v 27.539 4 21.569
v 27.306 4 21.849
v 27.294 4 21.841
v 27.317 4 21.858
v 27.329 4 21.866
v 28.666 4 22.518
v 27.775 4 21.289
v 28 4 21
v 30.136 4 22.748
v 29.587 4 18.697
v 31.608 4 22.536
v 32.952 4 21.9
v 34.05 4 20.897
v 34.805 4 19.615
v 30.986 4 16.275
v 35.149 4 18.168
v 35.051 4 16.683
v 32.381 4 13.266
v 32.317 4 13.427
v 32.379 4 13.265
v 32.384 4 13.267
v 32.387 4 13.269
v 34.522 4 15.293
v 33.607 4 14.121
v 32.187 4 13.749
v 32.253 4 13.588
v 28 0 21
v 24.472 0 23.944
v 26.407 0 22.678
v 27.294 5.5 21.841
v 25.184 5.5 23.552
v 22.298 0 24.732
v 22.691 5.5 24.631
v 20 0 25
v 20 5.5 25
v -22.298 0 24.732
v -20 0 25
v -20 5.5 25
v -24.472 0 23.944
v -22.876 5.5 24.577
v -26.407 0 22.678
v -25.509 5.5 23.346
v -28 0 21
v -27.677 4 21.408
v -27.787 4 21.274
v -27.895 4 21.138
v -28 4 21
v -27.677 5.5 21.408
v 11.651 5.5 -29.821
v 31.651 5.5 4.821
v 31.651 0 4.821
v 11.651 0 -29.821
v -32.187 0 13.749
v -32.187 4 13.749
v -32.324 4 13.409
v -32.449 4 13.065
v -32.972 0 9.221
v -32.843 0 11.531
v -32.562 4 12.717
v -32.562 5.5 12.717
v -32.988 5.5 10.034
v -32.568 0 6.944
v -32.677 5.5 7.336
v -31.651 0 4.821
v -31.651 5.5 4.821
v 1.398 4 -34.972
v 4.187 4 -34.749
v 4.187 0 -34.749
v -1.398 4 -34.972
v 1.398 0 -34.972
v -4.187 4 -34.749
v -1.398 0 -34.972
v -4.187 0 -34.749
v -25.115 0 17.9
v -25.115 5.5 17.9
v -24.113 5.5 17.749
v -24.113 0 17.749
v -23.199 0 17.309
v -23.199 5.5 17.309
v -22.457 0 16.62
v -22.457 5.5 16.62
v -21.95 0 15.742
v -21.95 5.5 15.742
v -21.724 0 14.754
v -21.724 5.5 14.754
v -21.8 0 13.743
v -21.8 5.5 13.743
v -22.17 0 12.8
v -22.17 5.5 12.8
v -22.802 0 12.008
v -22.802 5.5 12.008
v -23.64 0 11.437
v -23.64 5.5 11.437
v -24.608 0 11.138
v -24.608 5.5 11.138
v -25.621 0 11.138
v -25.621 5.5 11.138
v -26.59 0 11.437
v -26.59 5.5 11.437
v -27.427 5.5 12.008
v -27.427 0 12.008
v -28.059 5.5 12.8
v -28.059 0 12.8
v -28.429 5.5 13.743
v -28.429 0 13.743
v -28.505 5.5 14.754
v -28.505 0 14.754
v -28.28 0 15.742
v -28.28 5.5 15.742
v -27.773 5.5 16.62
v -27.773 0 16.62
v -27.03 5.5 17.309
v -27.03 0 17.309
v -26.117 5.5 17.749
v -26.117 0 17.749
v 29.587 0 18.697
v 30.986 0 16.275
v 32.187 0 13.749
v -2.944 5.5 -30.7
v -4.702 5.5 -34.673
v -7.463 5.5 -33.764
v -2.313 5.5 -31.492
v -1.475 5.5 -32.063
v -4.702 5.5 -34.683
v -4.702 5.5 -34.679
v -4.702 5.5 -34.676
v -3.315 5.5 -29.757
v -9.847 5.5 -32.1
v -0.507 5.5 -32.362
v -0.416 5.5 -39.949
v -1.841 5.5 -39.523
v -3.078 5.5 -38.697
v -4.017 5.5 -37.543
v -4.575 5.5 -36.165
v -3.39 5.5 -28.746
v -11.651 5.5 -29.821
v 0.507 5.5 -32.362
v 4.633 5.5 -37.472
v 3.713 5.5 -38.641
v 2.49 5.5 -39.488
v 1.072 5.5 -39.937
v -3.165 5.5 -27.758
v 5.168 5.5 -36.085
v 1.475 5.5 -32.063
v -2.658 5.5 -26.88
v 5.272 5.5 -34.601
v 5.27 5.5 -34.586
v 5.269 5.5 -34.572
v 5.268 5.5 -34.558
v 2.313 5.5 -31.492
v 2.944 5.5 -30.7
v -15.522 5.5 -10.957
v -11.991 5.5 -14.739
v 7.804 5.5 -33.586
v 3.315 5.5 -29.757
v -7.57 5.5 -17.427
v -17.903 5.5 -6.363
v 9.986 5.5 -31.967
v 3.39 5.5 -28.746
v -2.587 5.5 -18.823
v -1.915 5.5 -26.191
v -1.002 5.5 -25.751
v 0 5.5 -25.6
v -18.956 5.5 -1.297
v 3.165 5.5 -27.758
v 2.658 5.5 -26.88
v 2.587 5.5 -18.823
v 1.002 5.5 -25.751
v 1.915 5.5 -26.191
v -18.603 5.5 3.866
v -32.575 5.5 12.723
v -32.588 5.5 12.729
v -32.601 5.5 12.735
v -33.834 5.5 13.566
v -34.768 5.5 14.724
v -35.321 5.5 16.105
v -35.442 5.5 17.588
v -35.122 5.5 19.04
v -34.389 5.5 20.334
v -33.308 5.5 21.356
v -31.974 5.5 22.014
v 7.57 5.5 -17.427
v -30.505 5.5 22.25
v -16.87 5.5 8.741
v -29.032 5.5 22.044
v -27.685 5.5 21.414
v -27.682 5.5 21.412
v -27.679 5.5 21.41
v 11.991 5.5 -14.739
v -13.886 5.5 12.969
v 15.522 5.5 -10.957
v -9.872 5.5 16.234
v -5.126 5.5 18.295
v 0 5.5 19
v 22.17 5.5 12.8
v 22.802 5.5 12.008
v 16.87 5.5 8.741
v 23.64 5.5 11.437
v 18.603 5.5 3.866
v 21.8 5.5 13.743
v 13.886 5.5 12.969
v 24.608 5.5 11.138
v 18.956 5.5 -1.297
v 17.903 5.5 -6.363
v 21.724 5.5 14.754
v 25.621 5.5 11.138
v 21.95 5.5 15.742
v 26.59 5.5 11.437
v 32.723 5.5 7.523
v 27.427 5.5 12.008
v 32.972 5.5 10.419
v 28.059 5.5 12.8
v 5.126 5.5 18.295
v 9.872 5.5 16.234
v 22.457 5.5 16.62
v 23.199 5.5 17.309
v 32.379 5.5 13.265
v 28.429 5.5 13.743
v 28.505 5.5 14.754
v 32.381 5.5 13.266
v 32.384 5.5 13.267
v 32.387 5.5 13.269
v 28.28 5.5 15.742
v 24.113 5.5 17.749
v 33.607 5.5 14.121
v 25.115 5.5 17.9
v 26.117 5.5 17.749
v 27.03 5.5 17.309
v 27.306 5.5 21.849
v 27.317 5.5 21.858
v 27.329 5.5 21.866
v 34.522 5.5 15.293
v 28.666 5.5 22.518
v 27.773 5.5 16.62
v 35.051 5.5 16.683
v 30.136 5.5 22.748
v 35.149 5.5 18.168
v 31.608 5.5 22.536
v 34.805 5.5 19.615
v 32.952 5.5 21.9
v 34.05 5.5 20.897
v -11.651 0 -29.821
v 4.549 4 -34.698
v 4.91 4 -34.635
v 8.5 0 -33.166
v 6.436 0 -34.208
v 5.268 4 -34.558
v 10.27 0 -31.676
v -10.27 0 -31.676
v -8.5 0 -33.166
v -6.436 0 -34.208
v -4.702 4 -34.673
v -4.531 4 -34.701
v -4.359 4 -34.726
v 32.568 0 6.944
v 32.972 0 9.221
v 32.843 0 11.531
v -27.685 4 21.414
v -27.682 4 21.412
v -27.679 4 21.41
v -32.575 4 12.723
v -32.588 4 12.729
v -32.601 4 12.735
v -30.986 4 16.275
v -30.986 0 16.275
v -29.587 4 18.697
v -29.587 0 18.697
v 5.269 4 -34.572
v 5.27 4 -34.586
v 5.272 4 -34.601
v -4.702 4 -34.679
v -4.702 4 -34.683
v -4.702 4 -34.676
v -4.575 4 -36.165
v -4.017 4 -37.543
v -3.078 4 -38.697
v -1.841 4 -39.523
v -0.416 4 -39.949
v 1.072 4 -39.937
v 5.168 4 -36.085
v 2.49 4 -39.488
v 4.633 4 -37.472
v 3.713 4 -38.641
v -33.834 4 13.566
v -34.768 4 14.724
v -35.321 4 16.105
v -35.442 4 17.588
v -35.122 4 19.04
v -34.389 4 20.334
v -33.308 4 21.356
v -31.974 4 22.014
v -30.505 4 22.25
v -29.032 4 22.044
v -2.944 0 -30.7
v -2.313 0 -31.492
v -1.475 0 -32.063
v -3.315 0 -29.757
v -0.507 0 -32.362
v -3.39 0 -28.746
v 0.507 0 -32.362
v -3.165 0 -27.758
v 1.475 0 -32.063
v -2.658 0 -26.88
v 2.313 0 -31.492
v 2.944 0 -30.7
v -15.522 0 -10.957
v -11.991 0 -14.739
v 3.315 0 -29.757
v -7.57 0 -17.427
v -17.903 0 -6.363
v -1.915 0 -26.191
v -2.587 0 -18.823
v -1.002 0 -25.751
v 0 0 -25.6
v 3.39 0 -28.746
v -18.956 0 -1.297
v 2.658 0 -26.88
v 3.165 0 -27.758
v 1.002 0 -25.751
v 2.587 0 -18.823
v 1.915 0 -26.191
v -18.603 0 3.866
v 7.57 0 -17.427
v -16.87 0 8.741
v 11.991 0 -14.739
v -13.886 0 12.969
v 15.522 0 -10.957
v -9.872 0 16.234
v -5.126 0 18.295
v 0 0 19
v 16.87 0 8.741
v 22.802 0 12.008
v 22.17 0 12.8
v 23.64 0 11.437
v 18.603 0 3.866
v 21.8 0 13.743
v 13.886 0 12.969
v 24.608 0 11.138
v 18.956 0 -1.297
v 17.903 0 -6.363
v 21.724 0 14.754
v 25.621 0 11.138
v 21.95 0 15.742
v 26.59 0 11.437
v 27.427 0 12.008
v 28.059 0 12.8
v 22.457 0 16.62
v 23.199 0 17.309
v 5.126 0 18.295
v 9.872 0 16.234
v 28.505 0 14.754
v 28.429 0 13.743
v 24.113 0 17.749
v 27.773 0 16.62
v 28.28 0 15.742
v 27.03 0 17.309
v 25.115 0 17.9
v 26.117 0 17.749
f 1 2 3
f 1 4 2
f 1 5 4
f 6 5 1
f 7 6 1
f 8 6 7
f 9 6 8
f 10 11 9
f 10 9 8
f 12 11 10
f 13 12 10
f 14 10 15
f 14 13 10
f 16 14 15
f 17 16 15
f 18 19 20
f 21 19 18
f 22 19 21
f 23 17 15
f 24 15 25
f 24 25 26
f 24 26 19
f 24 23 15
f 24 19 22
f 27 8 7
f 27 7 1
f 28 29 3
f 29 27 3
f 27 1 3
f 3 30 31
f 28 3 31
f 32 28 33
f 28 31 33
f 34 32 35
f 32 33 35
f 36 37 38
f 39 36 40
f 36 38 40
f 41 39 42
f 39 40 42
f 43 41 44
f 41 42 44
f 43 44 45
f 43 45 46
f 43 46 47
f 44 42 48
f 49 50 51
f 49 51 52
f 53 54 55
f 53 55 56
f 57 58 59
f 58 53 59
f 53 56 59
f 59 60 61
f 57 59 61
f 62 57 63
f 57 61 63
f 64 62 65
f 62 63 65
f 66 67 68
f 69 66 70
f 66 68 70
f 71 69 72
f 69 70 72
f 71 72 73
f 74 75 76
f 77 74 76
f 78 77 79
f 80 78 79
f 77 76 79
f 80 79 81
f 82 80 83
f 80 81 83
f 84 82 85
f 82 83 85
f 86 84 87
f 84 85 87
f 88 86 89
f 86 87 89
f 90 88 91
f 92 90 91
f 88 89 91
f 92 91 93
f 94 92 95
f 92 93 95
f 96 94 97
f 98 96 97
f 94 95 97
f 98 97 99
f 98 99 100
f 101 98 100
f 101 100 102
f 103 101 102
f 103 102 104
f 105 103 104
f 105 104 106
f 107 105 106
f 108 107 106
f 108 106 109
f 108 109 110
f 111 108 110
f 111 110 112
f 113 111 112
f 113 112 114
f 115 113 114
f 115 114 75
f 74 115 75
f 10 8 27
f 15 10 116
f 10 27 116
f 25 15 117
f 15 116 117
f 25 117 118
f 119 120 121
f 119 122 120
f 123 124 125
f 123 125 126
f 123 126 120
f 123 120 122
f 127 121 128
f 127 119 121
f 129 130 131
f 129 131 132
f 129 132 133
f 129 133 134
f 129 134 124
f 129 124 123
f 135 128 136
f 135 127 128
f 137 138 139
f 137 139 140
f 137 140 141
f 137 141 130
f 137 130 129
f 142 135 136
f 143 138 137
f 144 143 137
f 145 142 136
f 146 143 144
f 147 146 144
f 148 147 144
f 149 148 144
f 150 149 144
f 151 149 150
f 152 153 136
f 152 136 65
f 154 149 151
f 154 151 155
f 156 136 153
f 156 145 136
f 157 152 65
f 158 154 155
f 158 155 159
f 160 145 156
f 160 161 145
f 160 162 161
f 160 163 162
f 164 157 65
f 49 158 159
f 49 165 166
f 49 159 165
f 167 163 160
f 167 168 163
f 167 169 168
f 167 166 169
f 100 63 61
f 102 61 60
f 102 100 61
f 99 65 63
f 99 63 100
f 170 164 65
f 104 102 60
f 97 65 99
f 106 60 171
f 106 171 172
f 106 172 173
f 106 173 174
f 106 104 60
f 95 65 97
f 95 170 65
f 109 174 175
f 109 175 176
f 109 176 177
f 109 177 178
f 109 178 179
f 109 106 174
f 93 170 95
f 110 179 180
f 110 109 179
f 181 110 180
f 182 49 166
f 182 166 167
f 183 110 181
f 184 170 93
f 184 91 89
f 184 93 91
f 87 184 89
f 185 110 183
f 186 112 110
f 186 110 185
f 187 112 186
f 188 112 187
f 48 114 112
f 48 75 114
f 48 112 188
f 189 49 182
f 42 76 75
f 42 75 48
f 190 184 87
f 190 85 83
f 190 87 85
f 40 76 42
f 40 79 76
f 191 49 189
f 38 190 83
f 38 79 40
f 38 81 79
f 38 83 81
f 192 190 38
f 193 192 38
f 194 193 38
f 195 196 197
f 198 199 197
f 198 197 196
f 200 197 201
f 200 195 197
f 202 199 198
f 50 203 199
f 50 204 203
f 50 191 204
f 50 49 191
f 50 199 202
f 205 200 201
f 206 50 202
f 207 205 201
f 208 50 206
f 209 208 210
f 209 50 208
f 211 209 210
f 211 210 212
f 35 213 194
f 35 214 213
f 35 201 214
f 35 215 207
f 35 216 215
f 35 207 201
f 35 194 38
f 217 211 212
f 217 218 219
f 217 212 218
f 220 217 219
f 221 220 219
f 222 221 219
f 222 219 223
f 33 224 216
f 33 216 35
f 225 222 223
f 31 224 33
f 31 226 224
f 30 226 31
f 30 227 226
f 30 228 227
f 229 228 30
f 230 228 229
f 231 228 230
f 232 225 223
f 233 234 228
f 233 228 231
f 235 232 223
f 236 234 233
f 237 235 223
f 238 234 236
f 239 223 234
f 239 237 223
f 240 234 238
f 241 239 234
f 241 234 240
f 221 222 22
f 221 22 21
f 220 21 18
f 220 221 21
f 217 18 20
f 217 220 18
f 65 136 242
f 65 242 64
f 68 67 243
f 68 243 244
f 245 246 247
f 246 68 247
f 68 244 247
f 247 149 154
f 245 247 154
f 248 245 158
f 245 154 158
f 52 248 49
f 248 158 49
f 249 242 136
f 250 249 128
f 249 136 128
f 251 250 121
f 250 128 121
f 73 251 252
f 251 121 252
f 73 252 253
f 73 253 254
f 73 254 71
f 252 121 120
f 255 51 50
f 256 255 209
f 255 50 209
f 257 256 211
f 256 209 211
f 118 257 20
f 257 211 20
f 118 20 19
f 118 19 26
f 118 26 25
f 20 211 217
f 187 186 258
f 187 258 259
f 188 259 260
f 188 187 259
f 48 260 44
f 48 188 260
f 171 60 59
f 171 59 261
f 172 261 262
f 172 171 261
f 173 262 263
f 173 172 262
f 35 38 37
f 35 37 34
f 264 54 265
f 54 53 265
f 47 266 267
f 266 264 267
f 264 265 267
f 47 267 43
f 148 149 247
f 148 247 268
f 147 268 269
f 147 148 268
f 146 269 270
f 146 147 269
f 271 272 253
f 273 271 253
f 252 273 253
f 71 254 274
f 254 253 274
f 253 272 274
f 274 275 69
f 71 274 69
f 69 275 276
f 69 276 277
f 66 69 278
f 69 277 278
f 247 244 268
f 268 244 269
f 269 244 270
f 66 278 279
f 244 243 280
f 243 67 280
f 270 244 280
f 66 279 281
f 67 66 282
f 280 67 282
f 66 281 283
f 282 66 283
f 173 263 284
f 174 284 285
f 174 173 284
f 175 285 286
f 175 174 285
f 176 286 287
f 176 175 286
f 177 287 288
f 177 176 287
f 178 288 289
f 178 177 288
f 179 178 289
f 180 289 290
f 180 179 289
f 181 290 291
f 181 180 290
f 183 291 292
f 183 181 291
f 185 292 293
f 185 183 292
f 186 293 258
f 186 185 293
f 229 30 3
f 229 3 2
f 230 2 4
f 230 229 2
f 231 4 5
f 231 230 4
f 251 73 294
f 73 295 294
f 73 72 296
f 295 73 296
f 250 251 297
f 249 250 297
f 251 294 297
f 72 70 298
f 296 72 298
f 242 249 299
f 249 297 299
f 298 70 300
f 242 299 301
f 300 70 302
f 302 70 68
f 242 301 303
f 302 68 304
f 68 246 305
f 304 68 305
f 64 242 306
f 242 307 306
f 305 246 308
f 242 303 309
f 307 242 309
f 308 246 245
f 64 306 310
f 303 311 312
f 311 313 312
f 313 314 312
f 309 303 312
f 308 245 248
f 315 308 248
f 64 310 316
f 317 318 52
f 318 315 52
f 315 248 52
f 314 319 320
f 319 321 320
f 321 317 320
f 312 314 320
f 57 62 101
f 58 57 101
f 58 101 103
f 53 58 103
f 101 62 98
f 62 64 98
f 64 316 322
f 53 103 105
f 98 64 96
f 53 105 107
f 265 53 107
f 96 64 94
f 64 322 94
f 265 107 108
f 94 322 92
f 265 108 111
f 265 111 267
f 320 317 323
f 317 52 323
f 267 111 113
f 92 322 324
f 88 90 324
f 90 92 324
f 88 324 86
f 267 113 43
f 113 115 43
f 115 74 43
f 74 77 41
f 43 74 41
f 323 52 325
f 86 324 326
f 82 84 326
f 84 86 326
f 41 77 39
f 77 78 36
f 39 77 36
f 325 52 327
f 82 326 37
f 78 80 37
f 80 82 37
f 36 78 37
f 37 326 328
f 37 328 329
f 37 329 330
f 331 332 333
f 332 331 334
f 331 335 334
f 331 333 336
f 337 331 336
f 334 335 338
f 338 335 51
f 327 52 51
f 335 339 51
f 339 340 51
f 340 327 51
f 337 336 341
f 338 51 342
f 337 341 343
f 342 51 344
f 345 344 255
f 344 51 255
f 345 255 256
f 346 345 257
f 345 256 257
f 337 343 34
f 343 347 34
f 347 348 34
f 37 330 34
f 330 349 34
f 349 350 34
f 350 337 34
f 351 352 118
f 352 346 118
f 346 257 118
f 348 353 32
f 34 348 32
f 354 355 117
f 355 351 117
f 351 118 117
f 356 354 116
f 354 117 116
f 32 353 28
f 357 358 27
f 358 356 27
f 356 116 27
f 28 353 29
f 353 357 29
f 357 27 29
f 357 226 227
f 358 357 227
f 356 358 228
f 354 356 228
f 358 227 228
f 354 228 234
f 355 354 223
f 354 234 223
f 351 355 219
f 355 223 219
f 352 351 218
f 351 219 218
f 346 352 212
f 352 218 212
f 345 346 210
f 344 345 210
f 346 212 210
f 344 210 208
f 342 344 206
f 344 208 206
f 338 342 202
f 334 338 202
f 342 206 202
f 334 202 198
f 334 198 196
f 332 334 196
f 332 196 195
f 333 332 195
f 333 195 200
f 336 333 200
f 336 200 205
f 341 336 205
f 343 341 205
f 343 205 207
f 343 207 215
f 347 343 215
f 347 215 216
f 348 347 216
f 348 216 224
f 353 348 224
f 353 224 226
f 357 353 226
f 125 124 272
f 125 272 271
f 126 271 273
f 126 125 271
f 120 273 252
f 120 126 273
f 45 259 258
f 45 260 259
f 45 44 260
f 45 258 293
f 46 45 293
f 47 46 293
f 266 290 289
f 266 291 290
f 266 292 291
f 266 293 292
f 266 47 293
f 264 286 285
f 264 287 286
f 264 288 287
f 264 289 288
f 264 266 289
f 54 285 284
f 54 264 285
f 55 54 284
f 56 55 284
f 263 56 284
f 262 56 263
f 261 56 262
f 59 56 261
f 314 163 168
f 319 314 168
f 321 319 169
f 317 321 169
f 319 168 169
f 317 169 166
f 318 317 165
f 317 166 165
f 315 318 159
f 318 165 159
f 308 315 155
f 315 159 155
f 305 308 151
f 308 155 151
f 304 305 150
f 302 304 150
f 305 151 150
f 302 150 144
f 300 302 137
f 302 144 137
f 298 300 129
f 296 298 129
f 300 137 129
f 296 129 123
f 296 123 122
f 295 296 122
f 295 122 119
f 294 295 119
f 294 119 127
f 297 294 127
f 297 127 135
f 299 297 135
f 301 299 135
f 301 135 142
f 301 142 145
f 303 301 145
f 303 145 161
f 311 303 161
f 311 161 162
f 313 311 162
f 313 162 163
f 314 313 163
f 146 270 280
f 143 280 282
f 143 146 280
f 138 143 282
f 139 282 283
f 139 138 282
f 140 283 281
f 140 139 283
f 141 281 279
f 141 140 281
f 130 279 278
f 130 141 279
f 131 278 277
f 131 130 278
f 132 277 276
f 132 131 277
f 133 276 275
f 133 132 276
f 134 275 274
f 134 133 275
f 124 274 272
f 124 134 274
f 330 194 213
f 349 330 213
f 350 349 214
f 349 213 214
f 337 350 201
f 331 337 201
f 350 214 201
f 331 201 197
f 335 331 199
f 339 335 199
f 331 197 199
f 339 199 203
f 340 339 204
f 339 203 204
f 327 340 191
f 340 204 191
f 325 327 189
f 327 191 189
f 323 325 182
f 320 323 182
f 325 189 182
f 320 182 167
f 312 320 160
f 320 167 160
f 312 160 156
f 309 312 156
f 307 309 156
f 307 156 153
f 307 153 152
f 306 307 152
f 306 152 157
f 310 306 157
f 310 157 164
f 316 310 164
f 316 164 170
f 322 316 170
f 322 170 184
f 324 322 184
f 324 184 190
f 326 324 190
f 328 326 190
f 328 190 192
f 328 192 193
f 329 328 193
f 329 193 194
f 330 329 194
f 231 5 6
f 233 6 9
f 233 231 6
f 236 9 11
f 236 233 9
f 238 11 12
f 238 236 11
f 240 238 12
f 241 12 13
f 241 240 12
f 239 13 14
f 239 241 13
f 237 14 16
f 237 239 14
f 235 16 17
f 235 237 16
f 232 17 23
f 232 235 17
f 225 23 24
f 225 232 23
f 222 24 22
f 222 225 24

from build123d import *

# Parameters (mm, degrees)
SKETCH1_R                = 17.5
BOSS_EXTRUDE1_DEPTH      = 5.5
SKETCH2_R                = 35
SKETCH2_R_2              = 17.5
SKETCH2_R_3              = 2.8
BOSS_EXTRUDE2_DEPTH      = 5.5
BOSS_EXTRUDE3_DEPTH      = 2
BOSS_EXTRUDE3_DEPTH_BACK = 5.5
SKETCH4_R                = 2.9
SKETCH5_R                = 5
BOSS_EXTRUDE4_DEPTH      = 1.5
SKETCH3_R                = 17.5
CUT_EXTRUDE1_DEPTH       = 10
SKETCH12_R               = 72.135852014
CUT_EXTRUDE2_DEPTH       = 22
FILLET1_R                = 10
SKETCH13_R               = 3.4
CUT_EXTRUDE3_DEPTH       = 10
SKETCH14_R               = 19
CUT_EXTRUDE4_DEPTH       = 10


with BuildPart() as part:
    # Sketch1 → Boss-Extrude1 (new body)
    with BuildSketch(Plane(origin=(0, 0, 0), x_dir=(1, 0, 0), z_dir=(0, 1, 0))):
        with Locations(Location((0, 0, 0), (0, 0, 270))):
            Circle(SKETCH1_R)
    extrude(amount=BOSS_EXTRUDE1_DEPTH)

    # Sketch2 → Boss-Extrude2 (add)
    with BuildSketch(Plane(origin=(0, 0, 0), x_dir=(1, 0, 0), z_dir=(0, 1, 0))):
        with Locations(Location((0, 0, 0), (0, 0, 270))):
            Circle(SKETCH2_R)
        Circle(SKETCH2_R_2, mode=Mode.SUBTRACT)
        with Locations(Location((0, 29, 0), (0, 0, 270))):
            Circle(SKETCH2_R_3, mode=Mode.SUBTRACT)
        with Locations(Location((25.11473671, -14.5, 0), (0, 0, 270))):
            Circle(SKETCH2_R_3, mode=Mode.SUBTRACT)
        with Locations(Location((-25.11473671, -14.5, 0), (0, 0, 270))):
            Circle(SKETCH2_R_3, mode=Mode.SUBTRACT)
    extrude(amount=BOSS_EXTRUDE2_DEPTH)

    # Sketch4 → Boss-Extrude3 (add, two sides: drawn at the far end of the back side and taken through both)
    with BuildSketch(Plane.XZ.offset(-BOSS_EXTRUDE3_DEPTH_BACK)):
        with Locations(Location((-25.11473671, 14.5, 0), (0, 0, 270))):
            Circle(SKETCH4_R)
        with Locations(Location((25.11473671, 14.5, 0), (0, 0, 270))):
            Circle(SKETCH4_R)
        with Locations(Location((0, -29, 0), (0, 0, 270))):
            Circle(SKETCH4_R)
    extrude(amount=BOSS_EXTRUDE3_DEPTH + BOSS_EXTRUDE3_DEPTH_BACK)

    # Sketch5 → Boss-Extrude4 (add)
    with BuildSketch(Plane(origin=(0, 5.5, 0), x_dir=(1, 0, 0), z_dir=(0, 1, 0))):
        with Locations((-30.453629482, -17.250404383)):
            Circle(SKETCH5_R)
        with Locations((0.28752632, 34.99881896)):
            Circle(SKETCH5_R)
        with Locations((30.166103162, -17.748414577)):
            Circle(SKETCH5_R)
    extrude(amount=-BOSS_EXTRUDE4_DEPTH)

    # Sketch3 → Cut-Extrude1 (cut)
    with BuildSketch(Plane(origin=(0, 5.5, 0), x_dir=(1, 0, 0), z_dir=(0, 1, 0))):
        with Locations(Location((0, 0, 0), (0, 0, 270))):
            Circle(SKETCH3_R)
    extrude(amount=-CUT_EXTRUDE1_DEPTH, mode=Mode.SUBTRACT)

    # Sketch12 → Cut-Extrude2 (cut)
    with BuildSketch(Plane(origin=(0, 5.5, 0), x_dir=(1, 0, 0), z_dir=(0, 1, 0))):
        Circle(SKETCH12_R)
        Polygon((0, 50), (-43.301270189, -25), (43.301270189, -25), align=None, mode=Mode.SUBTRACT)
    extrude(amount=-CUT_EXTRUDE2_DEPTH, mode=Mode.SUBTRACT)

    # Fillet1
    # the kernel refuses this fillet: 10 mm, written as the material it takes off along each edge
    with BuildSketch(Plane(origin=(-24.494897428, 18.7960859, 25), x_dir=(1, 0, 0), z_dir=(0, -1, 0))) as fillet1_piece_1_section:
        with BuildLine():
            CenterArc((4.494897428, -10), FILLET1_R, 90, 53.130102354)
            ThreePointArc((-3.505102572, -4), (-1.828638885, -1.933326291), (0, 0))
            Line((0, 0), (4.494897428, 0))
        make_face()
    fillet1_piece_1 = extrude(amount=32.0921718, mode=Mode.PRIVATE)
    fillet1_piece_1 = fillet1_piece_1 - Plane(origin=(-30.453629482, 4.75, 17.250404383), x_dir=(1, 0, 0), z_dir=(0, 1, 0)) * Cylinder(5, 83, mode=Mode.PRIVATE)
    add(fillet1_piece_1, mode=Mode.SUBTRACT)
    with BuildSketch(Plane(origin=(-24.494897428, 18.7960859, 25), x_dir=(1, 0, 0), z_dir=(0, -1, 0))) as fillet1_piece_2_section:
        with BuildLine():
            CenterArc((4.494897428, -10), FILLET1_R, 90, 53.130102354)
            ThreePointArc((-3.505102572, -4), (-1.828638885, -1.933326291), (0, 0))
            Line((0, 0), (4.494897428, 0))
        make_face()
    fillet1_piece_2 = extrude(amount=32.0921718, mode=Mode.PRIVATE)
    fillet1_piece_2 = split(fillet1_piece_2, bisect_by=Plane(origin=(-27.761621835, 4, 21.309124186), z_dir=(0, -1, 0)), keep=Keep.TOP, mode=Mode.PRIVATE)
    add(fillet1_piece_2, mode=Mode.SUBTRACT)
    with BuildSketch(Plane(origin=(24.494897428, 18.7960859, 25), x_dir=(-1, 0, 0), z_dir=(0, -1, 0))) as fillet1_piece_3_section:
        with BuildLine():
            CenterArc((4.494897428, 10), FILLET1_R, 216.869897646, 53.130102354)
            ThreePointArc((-3.505102572, 4), (-1.828638885, 1.933326291), (0, 0))
            Line((0, 0), (4.494897428, 0))
        make_face()
    fillet1_piece_3 = extrude(amount=32.0921718, mode=Mode.PRIVATE)
    fillet1_piece_3 = fillet1_piece_3 - Plane(origin=(30.166103162, 4.75, 17.748414577), x_dir=(1, 0, 0), z_dir=(0, 1, 0)) * Cylinder(5, 83, mode=Mode.PRIVATE)
    add(fillet1_piece_3, mode=Mode.SUBTRACT)
    with BuildSketch(Plane(origin=(24.494897428, 18.7960859, 25), x_dir=(-1, 0, 0), z_dir=(0, -1, 0))) as fillet1_piece_4_section:
        with BuildLine():
            CenterArc((4.494897428, 10), FILLET1_R, 216.869897646, 53.130102354)
            ThreePointArc((-3.505102572, 4), (-1.828638885, 1.933326291), (0, 0))
            Line((0, 0), (4.494897428, 0))
        make_face()
    fillet1_piece_4 = extrude(amount=32.0921718, mode=Mode.PRIVATE)
    fillet1_piece_4 = split(fillet1_piece_4, bisect_by=Plane(origin=(27.488157838, 4, 21.643747381), z_dir=(0, -1, 0)), keep=Keep.TOP, mode=Mode.PRIVATE)
    add(fillet1_piece_4, mode=Mode.SUBTRACT)
    with BuildSketch(Plane(origin=(-9.403186381, 18.7960859, -33.713203436), x_dir=(-0.5000000000000003, 0, 0.8660254037844386), z_dir=(0, -1, 0))) as fillet1_piece_5_section:
        with BuildLine():
            CenterArc((4.494897428, -10), FILLET1_R, 90, 53.130102354)
            ThreePointArc((-3.505102572, -4), (-1.828638885, -1.933326291), (0, 0))
            Line((0, 0), (4.494897428, 0))
        make_face()
    fillet1_piece_5 = extrude(amount=32.0921718, mode=Mode.PRIVATE)
    fillet1_piece_5 = fillet1_piece_5 - Plane(origin=(0.28752632, 4.75, -34.99881896), x_dir=(1, 0, 0), z_dir=(0, 1, 0)) * Cylinder(5, 83, mode=Mode.PRIVATE)
    add(fillet1_piece_5, mode=Mode.SUBTRACT)
    with BuildSketch(Plane(origin=(-9.403186381, 18.7960859, -33.713203436), x_dir=(-0.5000000000000003, 0, 0.8660254037844386), z_dir=(0, -1, 0))) as fillet1_piece_6_section:
        with BuildLine():
            CenterArc((4.494897428, -10), FILLET1_R, 90, 53.130102354)
            ThreePointArc((-3.505102572, -4), (-1.828638885, -1.933326291), (0, 0))
            Line((0, 0), (4.494897428, 0))
        make_face()
    fillet1_piece_6 = extrude(amount=32.0921718, mode=Mode.PRIVATE)
    fillet1_piece_6 = split(fillet1_piece_6, bisect_by=Plane(origin=(-4.57343196, 4, -34.696831852), z_dir=(0, -1, 0)), keep=Keep.TOP, mode=Mode.PRIVATE)
    add(fillet1_piece_6, mode=Mode.SUBTRACT)
    with BuildSketch(Plane(origin=(-33.898083809, 18.7960859, 8.713203436), x_dir=(0.32181469455231854, 0, 0.9468026734067654), z_dir=(0, -1, 0))) as fillet1_piece_7_section:
        with BuildLine():
            CenterArc((4.558658023, -9.971095222), FILLET1_R, 85.642603122, 53.130102354)
            Line((-2.962352352, -3.380617019), (0, 0))
            ThreePointArc((0, 0), (2.65921718, 0.101166725), (5.31843436, 0))
        make_face()
    fillet1_piece_7 = extrude(amount=32.0921718, mode=Mode.PRIVATE)
    fillet1_piece_7 = fillet1_piece_7 - Plane(origin=(-30.453629482, 4.75, 17.250404383), x_dir=(1, 0, 0), z_dir=(0, 1, 0)) * Cylinder(5, 86, mode=Mode.PRIVATE)
    add(fillet1_piece_7, mode=Mode.SUBTRACT)
    with BuildSketch(Plane(origin=(-33.898083809, 18.7960859, 8.713203436), x_dir=(0.32181469455231854, 0, 0.9468026734067654), z_dir=(0, -1, 0))) as fillet1_piece_8_section:
        with BuildLine():
            CenterArc((4.558658023, -9.971095222), FILLET1_R, 85.642603122, 53.130102354)
            Line((-2.962352352, -3.380617019), (0, 0))
            ThreePointArc((0, 0), (2.65921718, 0.101166725), (5.31843436, 0))
        make_face()
    fillet1_piece_8 = extrude(amount=32.0921718, mode=Mode.PRIVATE)
    fillet1_piece_8 = split(fillet1_piece_8, bisect_by=Plane(origin=(-32.488113984, 4, 12.9835693), z_dir=(0, -1, 0)), keep=Keep.TOP, mode=Mode.PRIVATE)
    add(fillet1_piece_8, mode=Mode.SUBTRACT)
    with BuildSketch(Plane(origin=(33.898083809, 18.7960859, 8.713203436), x_dir=(-0.5000000000000012, 0, -0.8660254037844382), z_dir=(0, -1, 0))) as fillet1_piece_9_section:
        with BuildLine():
            CenterArc((4.494897428, -10), FILLET1_R, 90, 53.130102354)
            ThreePointArc((-3.505102572, -4), (-1.828638885, -1.933326291), (0, 0))
            Line((0, 0), (4.494897428, 0))
        make_face()
    fillet1_piece_9 = extrude(amount=32.0921718, mode=Mode.PRIVATE)
    fillet1_piece_9 = fillet1_piece_9 - Plane(origin=(30.166103162, 4.75, 17.748414577), x_dir=(1, 0, 0), z_dir=(0, 1, 0)) * Cylinder(5, 83, mode=Mode.PRIVATE)
    add(fillet1_piece_9, mode=Mode.SUBTRACT)
    with BuildSketch(Plane(origin=(33.898083809, 18.7960859, 8.713203436), x_dir=(-0.5000000000000012, 0, -0.8660254037844382), z_dir=(0, -1, 0))) as fillet1_piece_10_section:
        with BuildLine():
            CenterArc((4.494897428, -10), FILLET1_R, 90, 53.130102354)
            ThreePointArc((-3.505102572, -4), (-1.828638885, -1.933326291), (0, 0))
            Line((0, 0), (4.494897428, 0))
        make_face()
    fillet1_piece_10 = extrude(amount=32.0921718, mode=Mode.PRIVATE)
    fillet1_piece_10 = split(fillet1_piece_10, bisect_by=Plane(origin=(32.335053795, 4, 13.387707666), z_dir=(0, -1, 0)), keep=Keep.TOP, mode=Mode.PRIVATE)
    add(fillet1_piece_10, mode=Mode.SUBTRACT)
    with BuildSketch(Plane(origin=(9.403186381, 18.7960859, -33.713203436), x_dir=(-0.9808625148174394, 0, -0.19470163590994477), z_dir=(0, -1, 0))) as fillet1_piece_11_section:
        with BuildLine():
            CenterArc((4.558658023, -9.971095222), FILLET1_R, 85.642603122, 53.130102354)
            Line((-2.962352352, -3.380617019), (0, 0))
            ThreePointArc((0, 0), (2.65921718, 0.101166725), (5.31843436, 0))
        make_face()
    fillet1_piece_11 = extrude(amount=32.0921718, mode=Mode.PRIVATE)
    fillet1_piece_11 = fillet1_piece_11 - Plane(origin=(0.28752632, 4.75, -34.99881896), x_dir=(1, 0, 0), z_dir=(0, 1, 0)) * Cylinder(5, 86, mode=Mode.PRIVATE)
    add(fillet1_piece_11, mode=Mode.SUBTRACT)
    with BuildSketch(Plane(origin=(9.403186381, 18.7960859, -33.713203436), x_dir=(-0.9808625148174394, 0, -0.19470163590994477), z_dir=(0, -1, 0))) as fillet1_piece_12_section:
        with BuildLine():
            CenterArc((4.558658023, -9.971095222), FILLET1_R, 85.642603122, 53.130102354)
            Line((-2.962352352, -3.380617019), (0, 0))
            ThreePointArc((0, 0), (2.65921718, 0.101166725), (5.31843436, 0))
        make_face()
    fillet1_piece_12 = extrude(amount=32.0921718, mode=Mode.PRIVATE)
    fillet1_piece_12 = split(fillet1_piece_12, bisect_by=Plane(origin=(4.999956146, 4, -34.627316681), z_dir=(0, -1, 0)), keep=Keep.TOP, mode=Mode.PRIVATE)
    add(fillet1_piece_12, mode=Mode.SUBTRACT)

    # Sketch13 → Cut-Extrude3 (cut)
    with BuildSketch(Plane(origin=(0, 5.5, 0), x_dir=(1, 0, 0), z_dir=(0, 1, 0))):
        with Locations(Location((0, 29, 0), (0, 0, 270))):
            Circle(SKETCH13_R)
        with Locations(Location((25.11473671, -14.5, 0), (0, 0, 270))):
            Circle(SKETCH13_R)
        with Locations(Location((-25.11473671, -14.5, 0), (0, 0, 270))):
            Circle(SKETCH13_R)
    extrude(amount=-CUT_EXTRUDE3_DEPTH, mode=Mode.SUBTRACT)

    # Sketch14 → Cut-Extrude4 (cut)
    with BuildSketch(Plane(origin=(0, 5.5, 0), x_dir=(1, 0, 0), z_dir=(0, 1, 0))):
        with Locations(Location((0, 0, 0), (0, 0, 270))):
            Circle(SKETCH14_R)
    extrude(amount=-CUT_EXTRUDE4_DEPTH, mode=Mode.SUBTRACT)


solid = part.part
